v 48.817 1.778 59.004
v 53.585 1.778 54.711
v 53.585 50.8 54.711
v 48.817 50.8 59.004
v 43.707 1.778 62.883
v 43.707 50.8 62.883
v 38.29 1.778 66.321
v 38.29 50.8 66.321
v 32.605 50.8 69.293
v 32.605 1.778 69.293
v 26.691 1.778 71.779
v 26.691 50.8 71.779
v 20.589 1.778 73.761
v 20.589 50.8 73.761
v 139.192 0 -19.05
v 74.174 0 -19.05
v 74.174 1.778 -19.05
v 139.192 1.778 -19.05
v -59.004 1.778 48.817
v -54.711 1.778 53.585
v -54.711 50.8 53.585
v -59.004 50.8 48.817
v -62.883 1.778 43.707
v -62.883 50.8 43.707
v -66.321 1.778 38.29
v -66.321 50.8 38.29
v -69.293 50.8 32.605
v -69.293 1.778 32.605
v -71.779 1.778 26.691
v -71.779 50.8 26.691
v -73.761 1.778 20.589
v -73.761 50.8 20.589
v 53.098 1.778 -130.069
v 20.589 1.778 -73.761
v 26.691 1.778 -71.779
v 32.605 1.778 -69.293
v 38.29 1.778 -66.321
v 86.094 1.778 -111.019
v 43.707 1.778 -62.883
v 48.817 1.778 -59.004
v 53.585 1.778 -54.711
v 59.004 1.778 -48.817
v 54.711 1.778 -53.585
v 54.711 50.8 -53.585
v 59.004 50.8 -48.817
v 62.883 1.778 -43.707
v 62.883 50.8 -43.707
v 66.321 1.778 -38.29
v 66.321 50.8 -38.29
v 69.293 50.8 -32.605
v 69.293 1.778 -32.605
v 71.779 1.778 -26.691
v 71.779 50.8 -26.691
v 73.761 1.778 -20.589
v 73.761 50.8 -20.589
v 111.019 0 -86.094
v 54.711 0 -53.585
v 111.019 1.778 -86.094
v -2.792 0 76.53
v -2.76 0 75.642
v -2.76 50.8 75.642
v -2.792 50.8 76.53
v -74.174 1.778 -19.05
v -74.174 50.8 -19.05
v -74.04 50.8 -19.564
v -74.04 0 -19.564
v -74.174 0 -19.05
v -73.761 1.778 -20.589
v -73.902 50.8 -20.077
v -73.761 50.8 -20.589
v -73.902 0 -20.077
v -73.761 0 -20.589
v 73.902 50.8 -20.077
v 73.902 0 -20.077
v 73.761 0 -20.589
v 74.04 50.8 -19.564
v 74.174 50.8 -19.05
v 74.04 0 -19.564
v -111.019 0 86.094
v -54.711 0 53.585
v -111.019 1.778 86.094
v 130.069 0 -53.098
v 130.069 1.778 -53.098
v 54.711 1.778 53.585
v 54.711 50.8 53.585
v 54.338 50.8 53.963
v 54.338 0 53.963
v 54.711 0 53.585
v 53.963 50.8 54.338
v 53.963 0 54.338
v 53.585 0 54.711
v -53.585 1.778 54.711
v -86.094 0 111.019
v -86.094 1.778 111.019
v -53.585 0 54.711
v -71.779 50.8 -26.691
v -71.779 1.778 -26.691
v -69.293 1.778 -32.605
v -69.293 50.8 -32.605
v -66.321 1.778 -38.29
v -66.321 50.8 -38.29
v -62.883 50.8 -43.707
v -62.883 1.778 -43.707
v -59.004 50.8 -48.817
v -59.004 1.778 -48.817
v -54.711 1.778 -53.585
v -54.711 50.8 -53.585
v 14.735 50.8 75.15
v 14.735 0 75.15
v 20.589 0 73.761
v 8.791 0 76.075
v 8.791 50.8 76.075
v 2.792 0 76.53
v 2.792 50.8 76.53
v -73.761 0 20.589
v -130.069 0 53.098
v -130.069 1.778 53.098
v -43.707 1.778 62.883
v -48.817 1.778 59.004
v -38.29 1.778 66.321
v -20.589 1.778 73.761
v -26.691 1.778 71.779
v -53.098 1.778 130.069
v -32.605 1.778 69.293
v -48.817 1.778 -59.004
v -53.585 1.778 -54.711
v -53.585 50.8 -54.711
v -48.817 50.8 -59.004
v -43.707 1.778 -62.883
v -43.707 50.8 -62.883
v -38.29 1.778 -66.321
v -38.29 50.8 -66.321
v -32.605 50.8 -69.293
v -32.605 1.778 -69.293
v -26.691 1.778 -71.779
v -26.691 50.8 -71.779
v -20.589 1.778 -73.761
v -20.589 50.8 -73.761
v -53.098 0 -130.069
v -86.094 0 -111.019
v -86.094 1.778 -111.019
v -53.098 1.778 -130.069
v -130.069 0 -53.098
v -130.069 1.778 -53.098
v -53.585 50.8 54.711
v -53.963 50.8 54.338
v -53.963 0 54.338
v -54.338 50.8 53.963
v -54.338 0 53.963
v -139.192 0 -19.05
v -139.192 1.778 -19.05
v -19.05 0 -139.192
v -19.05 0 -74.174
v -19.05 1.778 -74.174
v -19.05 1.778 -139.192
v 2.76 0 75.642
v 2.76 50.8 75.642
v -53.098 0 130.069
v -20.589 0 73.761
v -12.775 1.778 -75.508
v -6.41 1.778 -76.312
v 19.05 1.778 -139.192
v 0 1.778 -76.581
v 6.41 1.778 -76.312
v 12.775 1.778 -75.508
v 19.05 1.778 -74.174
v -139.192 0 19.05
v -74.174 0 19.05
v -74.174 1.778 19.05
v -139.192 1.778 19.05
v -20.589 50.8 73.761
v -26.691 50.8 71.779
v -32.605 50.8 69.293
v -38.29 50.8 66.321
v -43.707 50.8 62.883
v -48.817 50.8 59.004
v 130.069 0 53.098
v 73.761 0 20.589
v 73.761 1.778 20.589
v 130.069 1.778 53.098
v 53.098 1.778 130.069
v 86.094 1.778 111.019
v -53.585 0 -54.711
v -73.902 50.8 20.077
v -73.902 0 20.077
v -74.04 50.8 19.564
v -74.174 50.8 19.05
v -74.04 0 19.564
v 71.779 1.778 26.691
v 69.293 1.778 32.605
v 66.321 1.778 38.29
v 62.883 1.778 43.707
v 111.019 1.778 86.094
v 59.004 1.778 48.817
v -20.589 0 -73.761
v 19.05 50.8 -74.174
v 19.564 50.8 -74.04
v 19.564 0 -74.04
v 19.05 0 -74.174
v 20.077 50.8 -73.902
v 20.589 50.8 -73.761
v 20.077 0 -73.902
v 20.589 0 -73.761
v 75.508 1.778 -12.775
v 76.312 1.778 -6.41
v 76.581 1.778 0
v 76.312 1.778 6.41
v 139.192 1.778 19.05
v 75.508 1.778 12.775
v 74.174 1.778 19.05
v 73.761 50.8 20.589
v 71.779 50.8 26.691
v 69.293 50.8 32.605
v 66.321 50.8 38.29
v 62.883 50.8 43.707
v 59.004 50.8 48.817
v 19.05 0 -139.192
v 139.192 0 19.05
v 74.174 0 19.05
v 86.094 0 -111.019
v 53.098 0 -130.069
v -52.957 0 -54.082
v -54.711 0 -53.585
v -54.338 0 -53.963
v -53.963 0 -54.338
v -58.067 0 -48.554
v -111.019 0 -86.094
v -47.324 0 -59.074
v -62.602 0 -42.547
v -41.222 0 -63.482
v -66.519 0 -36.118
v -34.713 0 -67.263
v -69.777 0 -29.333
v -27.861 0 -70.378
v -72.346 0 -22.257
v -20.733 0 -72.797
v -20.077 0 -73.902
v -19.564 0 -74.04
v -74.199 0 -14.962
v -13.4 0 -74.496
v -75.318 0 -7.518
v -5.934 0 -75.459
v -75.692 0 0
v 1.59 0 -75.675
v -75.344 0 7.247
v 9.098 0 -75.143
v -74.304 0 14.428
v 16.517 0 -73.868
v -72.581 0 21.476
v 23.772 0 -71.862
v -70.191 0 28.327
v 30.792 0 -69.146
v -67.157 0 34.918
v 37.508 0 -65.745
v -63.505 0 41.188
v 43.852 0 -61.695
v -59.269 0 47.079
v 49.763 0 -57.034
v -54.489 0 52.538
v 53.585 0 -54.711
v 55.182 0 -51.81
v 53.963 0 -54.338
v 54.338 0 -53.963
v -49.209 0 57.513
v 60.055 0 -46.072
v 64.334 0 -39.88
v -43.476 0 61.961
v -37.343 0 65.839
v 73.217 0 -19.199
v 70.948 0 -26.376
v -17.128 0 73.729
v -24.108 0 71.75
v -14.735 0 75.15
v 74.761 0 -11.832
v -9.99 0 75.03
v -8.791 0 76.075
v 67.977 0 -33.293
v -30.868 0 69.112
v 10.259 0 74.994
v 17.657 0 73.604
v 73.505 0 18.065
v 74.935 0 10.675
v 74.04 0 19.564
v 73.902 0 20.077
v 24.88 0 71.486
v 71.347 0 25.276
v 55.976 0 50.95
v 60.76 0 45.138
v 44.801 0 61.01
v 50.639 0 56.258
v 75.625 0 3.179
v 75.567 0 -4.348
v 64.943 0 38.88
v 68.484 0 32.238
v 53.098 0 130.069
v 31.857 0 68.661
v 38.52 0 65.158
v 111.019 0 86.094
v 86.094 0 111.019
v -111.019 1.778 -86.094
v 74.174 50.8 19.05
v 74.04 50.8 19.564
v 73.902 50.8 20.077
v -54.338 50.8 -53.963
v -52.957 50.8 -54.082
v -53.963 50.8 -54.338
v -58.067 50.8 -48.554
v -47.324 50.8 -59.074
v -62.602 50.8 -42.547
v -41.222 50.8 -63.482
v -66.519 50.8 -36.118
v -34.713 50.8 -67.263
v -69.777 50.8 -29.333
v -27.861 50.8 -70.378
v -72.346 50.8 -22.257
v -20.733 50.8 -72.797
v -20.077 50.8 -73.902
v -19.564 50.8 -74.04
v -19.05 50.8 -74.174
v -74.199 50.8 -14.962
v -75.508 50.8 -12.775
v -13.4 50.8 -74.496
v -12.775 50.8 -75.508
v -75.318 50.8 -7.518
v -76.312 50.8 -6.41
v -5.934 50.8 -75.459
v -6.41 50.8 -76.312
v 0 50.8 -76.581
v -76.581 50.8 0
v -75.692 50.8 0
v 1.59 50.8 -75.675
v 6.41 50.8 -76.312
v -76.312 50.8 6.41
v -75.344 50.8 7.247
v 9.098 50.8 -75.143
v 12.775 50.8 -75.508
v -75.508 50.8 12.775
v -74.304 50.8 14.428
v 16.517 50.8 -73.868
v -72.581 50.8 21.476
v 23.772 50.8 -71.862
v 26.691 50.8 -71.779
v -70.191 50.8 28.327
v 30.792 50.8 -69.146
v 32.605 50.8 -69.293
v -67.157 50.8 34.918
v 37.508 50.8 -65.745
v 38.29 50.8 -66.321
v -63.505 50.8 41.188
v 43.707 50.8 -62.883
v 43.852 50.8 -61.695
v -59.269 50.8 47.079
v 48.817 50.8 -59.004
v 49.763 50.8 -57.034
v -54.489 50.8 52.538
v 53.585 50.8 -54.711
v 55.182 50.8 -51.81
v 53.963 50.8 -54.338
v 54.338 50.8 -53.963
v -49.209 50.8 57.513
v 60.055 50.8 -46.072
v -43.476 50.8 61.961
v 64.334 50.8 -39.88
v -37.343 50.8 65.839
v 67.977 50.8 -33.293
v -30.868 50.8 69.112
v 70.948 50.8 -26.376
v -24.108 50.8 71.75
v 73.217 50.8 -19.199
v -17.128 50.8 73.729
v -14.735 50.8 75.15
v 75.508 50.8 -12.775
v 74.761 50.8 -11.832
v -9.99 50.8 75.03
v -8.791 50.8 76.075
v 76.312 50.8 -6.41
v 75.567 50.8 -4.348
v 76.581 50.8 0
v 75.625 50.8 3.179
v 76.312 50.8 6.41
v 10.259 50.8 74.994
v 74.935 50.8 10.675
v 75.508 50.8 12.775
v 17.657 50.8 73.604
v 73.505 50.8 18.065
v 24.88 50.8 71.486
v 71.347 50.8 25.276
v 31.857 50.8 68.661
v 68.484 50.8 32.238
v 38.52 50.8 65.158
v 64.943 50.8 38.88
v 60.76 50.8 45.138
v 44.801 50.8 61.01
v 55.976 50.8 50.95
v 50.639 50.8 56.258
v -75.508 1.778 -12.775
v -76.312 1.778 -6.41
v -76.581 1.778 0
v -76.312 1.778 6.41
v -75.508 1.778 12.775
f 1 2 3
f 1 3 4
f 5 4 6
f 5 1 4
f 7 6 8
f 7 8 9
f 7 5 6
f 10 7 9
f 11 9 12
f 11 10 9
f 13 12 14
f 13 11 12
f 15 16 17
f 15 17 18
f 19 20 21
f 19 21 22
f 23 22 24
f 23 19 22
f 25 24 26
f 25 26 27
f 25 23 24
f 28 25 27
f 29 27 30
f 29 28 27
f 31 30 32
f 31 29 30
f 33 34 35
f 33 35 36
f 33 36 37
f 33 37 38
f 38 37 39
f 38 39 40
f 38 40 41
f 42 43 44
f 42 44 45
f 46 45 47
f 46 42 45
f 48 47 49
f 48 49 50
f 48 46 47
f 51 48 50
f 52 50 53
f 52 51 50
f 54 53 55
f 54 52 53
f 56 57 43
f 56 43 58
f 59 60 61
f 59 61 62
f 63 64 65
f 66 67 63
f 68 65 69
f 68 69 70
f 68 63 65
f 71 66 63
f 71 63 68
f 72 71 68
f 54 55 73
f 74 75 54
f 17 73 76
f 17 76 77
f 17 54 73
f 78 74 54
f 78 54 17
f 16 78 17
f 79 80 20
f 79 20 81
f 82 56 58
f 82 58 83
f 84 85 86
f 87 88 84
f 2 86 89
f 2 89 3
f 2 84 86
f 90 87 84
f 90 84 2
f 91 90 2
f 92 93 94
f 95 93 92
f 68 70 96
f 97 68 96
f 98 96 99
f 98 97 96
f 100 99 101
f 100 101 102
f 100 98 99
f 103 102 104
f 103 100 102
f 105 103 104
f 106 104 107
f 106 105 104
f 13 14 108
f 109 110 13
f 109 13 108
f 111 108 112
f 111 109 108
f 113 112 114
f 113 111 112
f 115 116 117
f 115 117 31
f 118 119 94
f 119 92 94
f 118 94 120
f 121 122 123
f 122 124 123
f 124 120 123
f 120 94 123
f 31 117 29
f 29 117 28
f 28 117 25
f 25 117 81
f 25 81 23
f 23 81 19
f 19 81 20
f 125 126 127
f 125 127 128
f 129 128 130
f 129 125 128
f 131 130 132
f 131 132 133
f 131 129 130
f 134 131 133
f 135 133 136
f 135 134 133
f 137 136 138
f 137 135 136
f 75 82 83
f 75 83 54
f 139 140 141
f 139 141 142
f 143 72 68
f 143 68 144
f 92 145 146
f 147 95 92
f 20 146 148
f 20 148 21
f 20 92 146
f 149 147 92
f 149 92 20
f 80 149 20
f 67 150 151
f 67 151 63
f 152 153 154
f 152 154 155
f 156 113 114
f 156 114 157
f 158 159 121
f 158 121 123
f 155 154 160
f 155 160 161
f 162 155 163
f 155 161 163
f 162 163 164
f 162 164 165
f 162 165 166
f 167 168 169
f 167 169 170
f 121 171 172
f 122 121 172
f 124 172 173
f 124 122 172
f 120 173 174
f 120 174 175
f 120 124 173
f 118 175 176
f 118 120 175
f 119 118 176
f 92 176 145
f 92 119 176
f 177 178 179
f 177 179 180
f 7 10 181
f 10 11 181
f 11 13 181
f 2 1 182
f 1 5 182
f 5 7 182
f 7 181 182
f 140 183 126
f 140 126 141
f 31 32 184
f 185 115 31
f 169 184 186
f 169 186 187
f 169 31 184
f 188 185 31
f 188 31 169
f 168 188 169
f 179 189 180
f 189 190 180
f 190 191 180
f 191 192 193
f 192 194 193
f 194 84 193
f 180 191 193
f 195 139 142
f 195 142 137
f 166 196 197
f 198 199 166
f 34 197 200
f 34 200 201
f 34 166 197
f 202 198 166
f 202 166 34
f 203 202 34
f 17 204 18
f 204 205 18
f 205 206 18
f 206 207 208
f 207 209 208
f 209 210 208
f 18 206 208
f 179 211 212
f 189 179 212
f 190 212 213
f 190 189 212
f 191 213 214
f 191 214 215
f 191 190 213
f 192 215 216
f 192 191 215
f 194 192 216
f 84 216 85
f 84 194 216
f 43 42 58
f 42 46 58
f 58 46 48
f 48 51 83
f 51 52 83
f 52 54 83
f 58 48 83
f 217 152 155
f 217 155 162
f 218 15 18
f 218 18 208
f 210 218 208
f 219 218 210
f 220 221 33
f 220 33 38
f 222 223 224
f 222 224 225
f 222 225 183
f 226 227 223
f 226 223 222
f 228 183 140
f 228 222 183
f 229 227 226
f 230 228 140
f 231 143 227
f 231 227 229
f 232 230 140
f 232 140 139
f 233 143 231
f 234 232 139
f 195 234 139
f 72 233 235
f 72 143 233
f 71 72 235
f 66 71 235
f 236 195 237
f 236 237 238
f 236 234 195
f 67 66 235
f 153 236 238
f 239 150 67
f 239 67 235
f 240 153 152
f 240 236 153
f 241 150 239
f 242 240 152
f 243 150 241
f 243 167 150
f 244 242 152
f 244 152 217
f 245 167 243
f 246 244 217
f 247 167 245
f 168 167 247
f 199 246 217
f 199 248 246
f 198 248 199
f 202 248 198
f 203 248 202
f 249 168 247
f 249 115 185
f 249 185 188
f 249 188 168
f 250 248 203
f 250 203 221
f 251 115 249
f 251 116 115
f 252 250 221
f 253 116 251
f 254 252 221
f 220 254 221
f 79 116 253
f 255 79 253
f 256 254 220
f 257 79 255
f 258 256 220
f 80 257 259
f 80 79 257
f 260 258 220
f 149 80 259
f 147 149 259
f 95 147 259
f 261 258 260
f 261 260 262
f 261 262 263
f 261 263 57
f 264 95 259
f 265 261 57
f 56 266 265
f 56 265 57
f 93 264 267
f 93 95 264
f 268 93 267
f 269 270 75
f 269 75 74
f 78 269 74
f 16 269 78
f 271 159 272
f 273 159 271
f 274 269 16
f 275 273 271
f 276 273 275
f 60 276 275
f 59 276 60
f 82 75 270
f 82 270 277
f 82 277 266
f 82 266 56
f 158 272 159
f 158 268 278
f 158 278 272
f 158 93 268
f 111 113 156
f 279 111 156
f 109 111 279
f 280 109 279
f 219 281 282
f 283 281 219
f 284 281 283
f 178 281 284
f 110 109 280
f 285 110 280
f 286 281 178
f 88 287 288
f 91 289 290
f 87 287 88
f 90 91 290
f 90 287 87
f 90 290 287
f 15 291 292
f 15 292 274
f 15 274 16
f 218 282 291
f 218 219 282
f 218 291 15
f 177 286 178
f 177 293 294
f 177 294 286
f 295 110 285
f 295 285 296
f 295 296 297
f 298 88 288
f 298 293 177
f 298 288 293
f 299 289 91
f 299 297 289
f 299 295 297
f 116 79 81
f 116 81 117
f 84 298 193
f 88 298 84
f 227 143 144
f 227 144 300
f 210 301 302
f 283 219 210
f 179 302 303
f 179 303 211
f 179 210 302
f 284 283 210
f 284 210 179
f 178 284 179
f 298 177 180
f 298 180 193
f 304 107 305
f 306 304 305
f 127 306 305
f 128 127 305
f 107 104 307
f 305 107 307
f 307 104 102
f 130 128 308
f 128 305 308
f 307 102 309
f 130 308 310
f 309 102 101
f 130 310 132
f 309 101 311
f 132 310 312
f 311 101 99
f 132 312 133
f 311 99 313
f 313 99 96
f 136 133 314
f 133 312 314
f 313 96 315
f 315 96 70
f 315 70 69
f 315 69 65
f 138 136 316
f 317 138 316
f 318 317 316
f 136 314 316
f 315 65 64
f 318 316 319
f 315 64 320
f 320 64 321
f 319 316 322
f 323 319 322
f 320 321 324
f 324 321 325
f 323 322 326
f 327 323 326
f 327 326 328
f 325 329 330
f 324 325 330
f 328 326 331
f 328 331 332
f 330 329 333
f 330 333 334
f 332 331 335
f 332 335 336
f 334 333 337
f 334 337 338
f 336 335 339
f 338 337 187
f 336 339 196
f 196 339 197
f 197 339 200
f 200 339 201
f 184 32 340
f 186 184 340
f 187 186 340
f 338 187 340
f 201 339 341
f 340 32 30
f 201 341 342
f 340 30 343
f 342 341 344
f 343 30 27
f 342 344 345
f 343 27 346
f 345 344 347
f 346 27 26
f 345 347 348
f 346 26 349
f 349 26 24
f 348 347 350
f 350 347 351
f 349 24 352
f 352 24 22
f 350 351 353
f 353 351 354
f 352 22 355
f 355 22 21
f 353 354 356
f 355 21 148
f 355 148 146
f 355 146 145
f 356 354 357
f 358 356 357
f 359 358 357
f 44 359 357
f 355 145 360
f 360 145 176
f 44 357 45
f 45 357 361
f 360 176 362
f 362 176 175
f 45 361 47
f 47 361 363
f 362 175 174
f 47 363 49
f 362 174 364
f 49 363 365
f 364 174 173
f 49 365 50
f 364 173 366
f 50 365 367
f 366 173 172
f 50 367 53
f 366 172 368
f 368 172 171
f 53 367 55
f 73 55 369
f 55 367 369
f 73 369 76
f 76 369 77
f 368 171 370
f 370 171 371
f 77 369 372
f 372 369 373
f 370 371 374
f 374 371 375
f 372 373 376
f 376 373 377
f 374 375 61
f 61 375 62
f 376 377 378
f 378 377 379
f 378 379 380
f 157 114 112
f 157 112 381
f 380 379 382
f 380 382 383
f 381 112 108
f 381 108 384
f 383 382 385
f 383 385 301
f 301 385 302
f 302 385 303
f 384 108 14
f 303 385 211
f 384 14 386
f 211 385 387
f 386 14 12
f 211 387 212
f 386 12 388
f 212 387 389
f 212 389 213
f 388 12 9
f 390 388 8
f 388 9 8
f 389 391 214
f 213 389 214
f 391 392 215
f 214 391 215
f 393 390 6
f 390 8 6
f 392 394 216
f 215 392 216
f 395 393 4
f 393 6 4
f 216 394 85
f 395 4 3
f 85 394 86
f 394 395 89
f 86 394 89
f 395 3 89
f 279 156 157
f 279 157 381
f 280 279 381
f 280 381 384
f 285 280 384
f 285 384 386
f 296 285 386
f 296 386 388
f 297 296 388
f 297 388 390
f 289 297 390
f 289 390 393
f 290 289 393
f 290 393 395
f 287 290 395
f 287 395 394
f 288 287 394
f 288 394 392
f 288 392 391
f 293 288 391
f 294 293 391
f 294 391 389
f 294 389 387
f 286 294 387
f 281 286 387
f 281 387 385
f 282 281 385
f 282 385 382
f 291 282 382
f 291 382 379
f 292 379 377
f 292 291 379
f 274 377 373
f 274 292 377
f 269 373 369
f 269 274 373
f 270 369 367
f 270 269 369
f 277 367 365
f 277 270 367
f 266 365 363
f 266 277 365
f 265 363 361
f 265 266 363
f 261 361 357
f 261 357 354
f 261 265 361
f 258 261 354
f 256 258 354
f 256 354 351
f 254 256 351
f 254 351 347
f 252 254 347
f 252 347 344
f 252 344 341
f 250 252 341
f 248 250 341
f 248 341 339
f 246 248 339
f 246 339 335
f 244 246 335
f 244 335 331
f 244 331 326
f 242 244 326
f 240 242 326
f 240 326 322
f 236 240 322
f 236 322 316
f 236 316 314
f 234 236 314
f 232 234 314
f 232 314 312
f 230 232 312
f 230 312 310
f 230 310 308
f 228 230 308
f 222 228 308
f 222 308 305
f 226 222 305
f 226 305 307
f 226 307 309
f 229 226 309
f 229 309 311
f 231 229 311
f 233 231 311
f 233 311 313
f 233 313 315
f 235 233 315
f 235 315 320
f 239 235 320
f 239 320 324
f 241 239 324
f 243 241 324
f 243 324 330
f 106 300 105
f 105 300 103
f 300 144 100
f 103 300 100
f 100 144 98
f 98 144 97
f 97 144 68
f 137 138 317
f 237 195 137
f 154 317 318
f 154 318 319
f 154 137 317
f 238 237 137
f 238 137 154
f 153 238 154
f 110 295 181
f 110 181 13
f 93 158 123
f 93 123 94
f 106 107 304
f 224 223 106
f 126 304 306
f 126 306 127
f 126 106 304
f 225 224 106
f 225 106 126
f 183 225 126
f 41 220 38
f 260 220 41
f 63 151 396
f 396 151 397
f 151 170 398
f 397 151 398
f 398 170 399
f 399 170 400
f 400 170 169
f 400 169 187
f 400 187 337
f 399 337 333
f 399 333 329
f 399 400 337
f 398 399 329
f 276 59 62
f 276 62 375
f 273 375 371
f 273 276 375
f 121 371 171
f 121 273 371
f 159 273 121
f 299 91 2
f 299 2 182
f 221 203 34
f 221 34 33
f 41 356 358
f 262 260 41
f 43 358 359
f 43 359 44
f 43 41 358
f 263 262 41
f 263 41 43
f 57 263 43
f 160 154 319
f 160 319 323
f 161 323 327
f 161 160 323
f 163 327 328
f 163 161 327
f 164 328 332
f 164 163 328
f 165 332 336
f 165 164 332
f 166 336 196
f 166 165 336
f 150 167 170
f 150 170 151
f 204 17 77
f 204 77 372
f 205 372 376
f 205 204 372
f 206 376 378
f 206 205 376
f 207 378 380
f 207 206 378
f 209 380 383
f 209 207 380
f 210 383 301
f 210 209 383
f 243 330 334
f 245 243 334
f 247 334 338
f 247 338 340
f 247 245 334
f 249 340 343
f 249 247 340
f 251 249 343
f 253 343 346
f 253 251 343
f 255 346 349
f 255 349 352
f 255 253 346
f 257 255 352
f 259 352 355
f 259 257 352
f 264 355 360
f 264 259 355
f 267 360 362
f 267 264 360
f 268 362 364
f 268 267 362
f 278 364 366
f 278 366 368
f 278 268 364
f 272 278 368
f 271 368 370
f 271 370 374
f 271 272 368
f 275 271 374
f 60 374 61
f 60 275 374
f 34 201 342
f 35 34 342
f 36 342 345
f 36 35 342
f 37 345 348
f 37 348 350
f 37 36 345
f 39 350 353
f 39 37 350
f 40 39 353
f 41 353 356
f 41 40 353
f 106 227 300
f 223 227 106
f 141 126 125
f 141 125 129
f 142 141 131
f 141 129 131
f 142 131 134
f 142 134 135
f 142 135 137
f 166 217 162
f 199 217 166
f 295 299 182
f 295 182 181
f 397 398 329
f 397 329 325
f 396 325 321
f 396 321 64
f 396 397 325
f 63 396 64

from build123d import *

# Parameters (mm, degrees)
F1_DEPTH = 50.8
F2_DEPTH = 1.778


with BuildPart() as f1:
    # F0 (on Front) → F1 (new body)
    with BuildSketch(Plane.XZ):
        with BuildLine():
            ThreePointArc((-75.692, 0), (-54.489303, 52.537555), (-2.759729, 75.641673))
            Line((-2.759729, 75.641673), (-2.792142, 76.530082))
            ThreePointArc((-2.792142, 76.530082), (-11.7723, 75.670751), (-20.589097, 73.761363))
            ThreePointArc((-20.589097, 73.761363), (-38.2905, 66.321091), (-53.584665, 54.711363))
            ThreePointArc((-53.584665, 54.711363), (-54.150944, 54.150944), (-54.711363, 53.584665))
            ThreePointArc((-54.711363, 53.584665), (-66.321091, 38.2905), (-73.761363, 20.589097))
            ThreePointArc((-73.761363, 20.589097), (-73.971566, 19.820621), (-74.173763, 19.05))
            ThreePointArc((-74.173763, 19.05), (-75.976807, 9.600746), (-76.581, 0))
            Line((-76.581, 0), (-75.692, 0))
        make_face()
        with BuildLine():
            ThreePointArc((2.759729, 75.641673), (52.537555, -54.489303), (-75.692, 0))
            Line((-75.692, 0), (-76.581, 0))
            ThreePointArc((-76.581, 0), (-75.976807, -9.600746), (-74.173763, -19.05))
            ThreePointArc((-74.173763, -19.05), (-73.971566, -19.820621), (-73.761363, -20.589097))
            ThreePointArc((-73.761363, -20.589097), (-66.321091, -38.2905), (-54.711363, -53.584665))
            ThreePointArc((-54.711363, -53.584665), (-54.150944, -54.150944), (-53.584665, -54.711363))
            ThreePointArc((-53.584665, -54.711363), (-38.2905, -66.321091), (-20.589097, -73.761363))
            ThreePointArc((-20.589097, -73.761363), (-19.820621, -73.971566), (-19.05, -74.173763))
            ThreePointArc((-19.05, -74.173763), (0, -76.581), (19.05, -74.173763))
            ThreePointArc((19.05, -74.173763), (19.820621, -73.971566), (20.589097, -73.761363))
            ThreePointArc((20.589097, -73.761363), (38.2905, -66.321091), (53.584665, -54.711363))
            ThreePointArc((53.584665, -54.711363), (54.150944, -54.150944), (54.711363, -53.584665))
            ThreePointArc((54.711363, -53.584665), (66.321091, -38.2905), (73.761363, -20.589097))
            ThreePointArc((73.761363, -20.589097), (73.971566, -19.820621), (74.173763, -19.05))
            ThreePointArc((74.173763, -19.05), (76.581, 0), (74.173763, 19.05))
            ThreePointArc((74.173763, 19.05), (73.971566, 19.820621), (73.761363, 20.589097))
            ThreePointArc((73.761363, 20.589097), (66.321091, 38.2905), (54.711363, 53.584665))
            ThreePointArc((54.711363, 53.584665), (54.150944, 54.150944), (53.584665, 54.711363))
            ThreePointArc((53.584665, 54.711363), (38.2905, 66.321091), (20.589097, 73.761363))
            ThreePointArc((20.589097, 73.761363), (11.7723, 75.670751), (2.792142, 76.530082))
            Line((2.792142, 76.530082), (2.759729, 75.641673))
        make_face()
    extrude(amount=-F1_DEPTH)

    # F0 (on Front) → F2 (join)
    with BuildSketch(Plane.XZ):
        with BuildLine():
            ThreePointArc((-75.692, 0), (-54.489303, 52.537555), (-2.759729, 75.641673))
            Line((-2.759729, 75.641673), (-2.792142, 76.530082))
            ThreePointArc((-2.792142, 76.530082), (-11.7723, 75.670751), (-20.589097, 73.761363))
            ThreePointArc((-20.589097, 73.761363), (-38.2905, 66.321091), (-53.584665, 54.711363))
            ThreePointArc((-53.584665, 54.711363), (-54.150944, 54.150944), (-54.711363, 53.584665))
            ThreePointArc((-54.711363, 53.584665), (-66.321091, 38.2905), (-73.761363, 20.589097))
            ThreePointArc((-73.761363, 20.589097), (-73.971566, 19.820621), (-74.173763, 19.05))
            ThreePointArc((-74.173763, 19.05), (-75.976807, 9.600746), (-76.581, 0))
            Line((-76.581, 0), (-75.692, 0))
        make_face()
        with BuildLine():
            ThreePointArc((2.759729, 75.641673), (52.537555, -54.489303), (-75.692, 0))
            Line((-75.692, 0), (-76.581, 0))
            ThreePointArc((-76.581, 0), (-75.976807, -9.600746), (-74.173763, -19.05))
            ThreePointArc((-74.173763, -19.05), (-73.971566, -19.820621), (-73.761363, -20.589097))
            ThreePointArc((-73.761363, -20.589097), (-66.321091, -38.2905), (-54.711363, -53.584665))
            ThreePointArc((-54.711363, -53.584665), (-54.150944, -54.150944), (-53.584665, -54.711363))
            ThreePointArc((-53.584665, -54.711363), (-38.2905, -66.321091), (-20.589097, -73.761363))
            ThreePointArc((-20.589097, -73.761363), (-19.820621, -73.971566), (-19.05, -74.173763))
            ThreePointArc((-19.05, -74.173763), (0, -76.581), (19.05, -74.173763))
            ThreePointArc((19.05, -74.173763), (19.820621, -73.971566), (20.589097, -73.761363))
            ThreePointArc((20.589097, -73.761363), (38.2905, -66.321091), (53.584665, -54.711363))
            ThreePointArc((53.584665, -54.711363), (54.150944, -54.150944), (54.711363, -53.584665))
            ThreePointArc((54.711363, -53.584665), (66.321091, -38.2905), (73.761363, -20.589097))
            ThreePointArc((73.761363, -20.589097), (73.971566, -19.820621), (74.173763, -19.05))
            ThreePointArc((74.173763, -19.05), (76.581, 0), (74.173763, 19.05))
            ThreePointArc((74.173763, 19.05), (73.971566, 19.820621), (73.761363, 20.589097))
            ThreePointArc((73.761363, 20.589097), (66.321091, 38.2905), (54.711363, 53.584665))
            ThreePointArc((54.711363, 53.584665), (54.150944, 54.150944), (53.584665, 54.711363))
            ThreePointArc((53.584665, 54.711363), (38.2905, 66.321091), (20.589097, 73.761363))
            ThreePointArc((20.589097, 73.761363), (11.7723, 75.670751), (2.792142, 76.530082))
            Line((2.792142, 76.530082), (2.759729, 75.641673))
        make_face()
        with BuildLine():
            Line((-139.192, 0), (-76.581, 0))
            ThreePointArc((-76.581, 0), (-75.976807, 9.600746), (-74.173763, 19.05))
            Line((-74.173763, 19.05), (-139.192, 19.05))
            Line((-139.192, 19.05), (-139.192, 0))
        make_face()
        with BuildLine():
            ThreePointArc((-74.173763, -19.05), (-75.976807, -9.600746), (-76.581, 0))
            Line((-76.581, 0), (-139.192, 0))
            Line((-139.192, 0), (-139.192, -19.05))
            Line((-139.192, -19.05), (-74.173763, -19.05))
        make_face()
        with BuildLine():
            ThreePointArc((-53.584665, 54.711363), (-38.2905, 66.321091), (-20.589097, 73.761363))
            Line((-20.589097, 73.761363), (-53.098216, 130.068808))
            Line((-53.098216, 130.068808), (-69.596, 120.543808))
            Line((-69.596, 120.543808), (-86.093784, 111.018808))
            Line((-86.093784, 111.018808), (-53.584665, 54.711363))
        make_face()
        with BuildLine():
            Line((53.098216, 130.068808), (20.589097, 73.761363))
            ThreePointArc((20.589097, 73.761363), (38.2905, 66.321091), (53.584665, 54.711363))
            Line((53.584665, 54.711363), (86.093784, 111.018808))
            Line((86.093784, 111.018808), (69.596, 120.543808))
            Line((69.596, 120.543808), (53.098216, 130.068808))
        make_face()
        with BuildLine():
            Line((-130.068808, 53.098216), (-73.761363, 20.589097))
            ThreePointArc((-73.761363, 20.589097), (-66.321091, 38.2905), (-54.711363, 53.584665))
            Line((-54.711363, 53.584665), (-111.018808, 86.093784))
            Line((-111.018808, 86.093784), (-120.543808, 69.596))
            Line((-120.543808, 69.596), (-130.068808, 53.098216))
        make_face()
        with BuildLine():
            ThreePointArc((-54.711363, -53.584665), (-66.321091, -38.2905), (-73.761363, -20.589097))
            Line((-73.761363, -20.589097), (-130.068808, -53.098216))
            Line((-130.068808, -53.098216), (-120.543808, -69.596))
            Line((-120.543808, -69.596), (-111.018808, -86.093784))
            Line((-111.018808, -86.093784), (-54.711363, -53.584665))
        make_face()
        with BuildLine():
            Line((111.018808, 86.093784), (54.711363, 53.584665))
            ThreePointArc((54.711363, 53.584665), (66.321091, 38.2905), (73.761363, 20.589097))
            Line((73.761363, 20.589097), (130.068808, 53.098216))
            Line((130.068808, 53.098216), (120.543808, 69.596))
            Line((120.543808, 69.596), (111.018808, 86.093784))
        make_face()
        with BuildLine():
            ThreePointArc((-20.589097, -73.761363), (-38.2905, -66.321091), (-53.584665, -54.711363))
            Line((-53.584665, -54.711363), (-86.093784, -111.018808))
            Line((-86.093784, -111.018808), (-69.596, -120.543808))
            Line((-69.596, -120.543808), (-53.098216, -130.068808))
            Line((-53.098216, -130.068808), (-20.589097, -73.761363))
        make_face()
        with BuildLine():
            Line((139.192, 19.05), (74.173763, 19.05))
            ThreePointArc((74.173763, 19.05), (76.581, 0), (74.173763, -19.05))
            Line((74.173763, -19.05), (139.192, -19.05))
            Line((139.192, -19.05), (139.192, 0))
            Line((139.192, 0), (139.192, 19.05))
        make_face()
        with BuildLine():
            ThreePointArc((19.05, -74.173763), (0, -76.581), (-19.05, -74.173763))
            Line((-19.05, -74.173763), (-19.05, -139.192))
            Line((-19.05, -139.192), (0, -139.192))
            Line((0, -139.192), (19.05, -139.192))
            Line((19.05, -139.192), (19.05, -74.173763))
        make_face()
        with BuildLine():
            Line((130.068808, -53.098216), (73.761363, -20.589097))
            ThreePointArc((73.761363, -20.589097), (66.321091, -38.2905), (54.711363, -53.584665))
            Line((54.711363, -53.584665), (111.018808, -86.093784))
            Line((111.018808, -86.093784), (120.543808, -69.596))
            Line((120.543808, -69.596), (130.068808, -53.098216))
        make_face()
        with BuildLine():
            ThreePointArc((53.584665, -54.711363), (38.2905, -66.321091), (20.589097, -73.761363))
            Line((20.589097, -73.761363), (53.098216, -130.068808))
            Line((53.098216, -130.068808), (69.596, -120.543808))
            Line((69.596, -120.543808), (86.093784, -111.018808))
            Line((86.093784, -111.018808), (53.584665, -54.711363))
        make_face()
    extrude(amount=-F2_DEPTH)


solid = f1.part
